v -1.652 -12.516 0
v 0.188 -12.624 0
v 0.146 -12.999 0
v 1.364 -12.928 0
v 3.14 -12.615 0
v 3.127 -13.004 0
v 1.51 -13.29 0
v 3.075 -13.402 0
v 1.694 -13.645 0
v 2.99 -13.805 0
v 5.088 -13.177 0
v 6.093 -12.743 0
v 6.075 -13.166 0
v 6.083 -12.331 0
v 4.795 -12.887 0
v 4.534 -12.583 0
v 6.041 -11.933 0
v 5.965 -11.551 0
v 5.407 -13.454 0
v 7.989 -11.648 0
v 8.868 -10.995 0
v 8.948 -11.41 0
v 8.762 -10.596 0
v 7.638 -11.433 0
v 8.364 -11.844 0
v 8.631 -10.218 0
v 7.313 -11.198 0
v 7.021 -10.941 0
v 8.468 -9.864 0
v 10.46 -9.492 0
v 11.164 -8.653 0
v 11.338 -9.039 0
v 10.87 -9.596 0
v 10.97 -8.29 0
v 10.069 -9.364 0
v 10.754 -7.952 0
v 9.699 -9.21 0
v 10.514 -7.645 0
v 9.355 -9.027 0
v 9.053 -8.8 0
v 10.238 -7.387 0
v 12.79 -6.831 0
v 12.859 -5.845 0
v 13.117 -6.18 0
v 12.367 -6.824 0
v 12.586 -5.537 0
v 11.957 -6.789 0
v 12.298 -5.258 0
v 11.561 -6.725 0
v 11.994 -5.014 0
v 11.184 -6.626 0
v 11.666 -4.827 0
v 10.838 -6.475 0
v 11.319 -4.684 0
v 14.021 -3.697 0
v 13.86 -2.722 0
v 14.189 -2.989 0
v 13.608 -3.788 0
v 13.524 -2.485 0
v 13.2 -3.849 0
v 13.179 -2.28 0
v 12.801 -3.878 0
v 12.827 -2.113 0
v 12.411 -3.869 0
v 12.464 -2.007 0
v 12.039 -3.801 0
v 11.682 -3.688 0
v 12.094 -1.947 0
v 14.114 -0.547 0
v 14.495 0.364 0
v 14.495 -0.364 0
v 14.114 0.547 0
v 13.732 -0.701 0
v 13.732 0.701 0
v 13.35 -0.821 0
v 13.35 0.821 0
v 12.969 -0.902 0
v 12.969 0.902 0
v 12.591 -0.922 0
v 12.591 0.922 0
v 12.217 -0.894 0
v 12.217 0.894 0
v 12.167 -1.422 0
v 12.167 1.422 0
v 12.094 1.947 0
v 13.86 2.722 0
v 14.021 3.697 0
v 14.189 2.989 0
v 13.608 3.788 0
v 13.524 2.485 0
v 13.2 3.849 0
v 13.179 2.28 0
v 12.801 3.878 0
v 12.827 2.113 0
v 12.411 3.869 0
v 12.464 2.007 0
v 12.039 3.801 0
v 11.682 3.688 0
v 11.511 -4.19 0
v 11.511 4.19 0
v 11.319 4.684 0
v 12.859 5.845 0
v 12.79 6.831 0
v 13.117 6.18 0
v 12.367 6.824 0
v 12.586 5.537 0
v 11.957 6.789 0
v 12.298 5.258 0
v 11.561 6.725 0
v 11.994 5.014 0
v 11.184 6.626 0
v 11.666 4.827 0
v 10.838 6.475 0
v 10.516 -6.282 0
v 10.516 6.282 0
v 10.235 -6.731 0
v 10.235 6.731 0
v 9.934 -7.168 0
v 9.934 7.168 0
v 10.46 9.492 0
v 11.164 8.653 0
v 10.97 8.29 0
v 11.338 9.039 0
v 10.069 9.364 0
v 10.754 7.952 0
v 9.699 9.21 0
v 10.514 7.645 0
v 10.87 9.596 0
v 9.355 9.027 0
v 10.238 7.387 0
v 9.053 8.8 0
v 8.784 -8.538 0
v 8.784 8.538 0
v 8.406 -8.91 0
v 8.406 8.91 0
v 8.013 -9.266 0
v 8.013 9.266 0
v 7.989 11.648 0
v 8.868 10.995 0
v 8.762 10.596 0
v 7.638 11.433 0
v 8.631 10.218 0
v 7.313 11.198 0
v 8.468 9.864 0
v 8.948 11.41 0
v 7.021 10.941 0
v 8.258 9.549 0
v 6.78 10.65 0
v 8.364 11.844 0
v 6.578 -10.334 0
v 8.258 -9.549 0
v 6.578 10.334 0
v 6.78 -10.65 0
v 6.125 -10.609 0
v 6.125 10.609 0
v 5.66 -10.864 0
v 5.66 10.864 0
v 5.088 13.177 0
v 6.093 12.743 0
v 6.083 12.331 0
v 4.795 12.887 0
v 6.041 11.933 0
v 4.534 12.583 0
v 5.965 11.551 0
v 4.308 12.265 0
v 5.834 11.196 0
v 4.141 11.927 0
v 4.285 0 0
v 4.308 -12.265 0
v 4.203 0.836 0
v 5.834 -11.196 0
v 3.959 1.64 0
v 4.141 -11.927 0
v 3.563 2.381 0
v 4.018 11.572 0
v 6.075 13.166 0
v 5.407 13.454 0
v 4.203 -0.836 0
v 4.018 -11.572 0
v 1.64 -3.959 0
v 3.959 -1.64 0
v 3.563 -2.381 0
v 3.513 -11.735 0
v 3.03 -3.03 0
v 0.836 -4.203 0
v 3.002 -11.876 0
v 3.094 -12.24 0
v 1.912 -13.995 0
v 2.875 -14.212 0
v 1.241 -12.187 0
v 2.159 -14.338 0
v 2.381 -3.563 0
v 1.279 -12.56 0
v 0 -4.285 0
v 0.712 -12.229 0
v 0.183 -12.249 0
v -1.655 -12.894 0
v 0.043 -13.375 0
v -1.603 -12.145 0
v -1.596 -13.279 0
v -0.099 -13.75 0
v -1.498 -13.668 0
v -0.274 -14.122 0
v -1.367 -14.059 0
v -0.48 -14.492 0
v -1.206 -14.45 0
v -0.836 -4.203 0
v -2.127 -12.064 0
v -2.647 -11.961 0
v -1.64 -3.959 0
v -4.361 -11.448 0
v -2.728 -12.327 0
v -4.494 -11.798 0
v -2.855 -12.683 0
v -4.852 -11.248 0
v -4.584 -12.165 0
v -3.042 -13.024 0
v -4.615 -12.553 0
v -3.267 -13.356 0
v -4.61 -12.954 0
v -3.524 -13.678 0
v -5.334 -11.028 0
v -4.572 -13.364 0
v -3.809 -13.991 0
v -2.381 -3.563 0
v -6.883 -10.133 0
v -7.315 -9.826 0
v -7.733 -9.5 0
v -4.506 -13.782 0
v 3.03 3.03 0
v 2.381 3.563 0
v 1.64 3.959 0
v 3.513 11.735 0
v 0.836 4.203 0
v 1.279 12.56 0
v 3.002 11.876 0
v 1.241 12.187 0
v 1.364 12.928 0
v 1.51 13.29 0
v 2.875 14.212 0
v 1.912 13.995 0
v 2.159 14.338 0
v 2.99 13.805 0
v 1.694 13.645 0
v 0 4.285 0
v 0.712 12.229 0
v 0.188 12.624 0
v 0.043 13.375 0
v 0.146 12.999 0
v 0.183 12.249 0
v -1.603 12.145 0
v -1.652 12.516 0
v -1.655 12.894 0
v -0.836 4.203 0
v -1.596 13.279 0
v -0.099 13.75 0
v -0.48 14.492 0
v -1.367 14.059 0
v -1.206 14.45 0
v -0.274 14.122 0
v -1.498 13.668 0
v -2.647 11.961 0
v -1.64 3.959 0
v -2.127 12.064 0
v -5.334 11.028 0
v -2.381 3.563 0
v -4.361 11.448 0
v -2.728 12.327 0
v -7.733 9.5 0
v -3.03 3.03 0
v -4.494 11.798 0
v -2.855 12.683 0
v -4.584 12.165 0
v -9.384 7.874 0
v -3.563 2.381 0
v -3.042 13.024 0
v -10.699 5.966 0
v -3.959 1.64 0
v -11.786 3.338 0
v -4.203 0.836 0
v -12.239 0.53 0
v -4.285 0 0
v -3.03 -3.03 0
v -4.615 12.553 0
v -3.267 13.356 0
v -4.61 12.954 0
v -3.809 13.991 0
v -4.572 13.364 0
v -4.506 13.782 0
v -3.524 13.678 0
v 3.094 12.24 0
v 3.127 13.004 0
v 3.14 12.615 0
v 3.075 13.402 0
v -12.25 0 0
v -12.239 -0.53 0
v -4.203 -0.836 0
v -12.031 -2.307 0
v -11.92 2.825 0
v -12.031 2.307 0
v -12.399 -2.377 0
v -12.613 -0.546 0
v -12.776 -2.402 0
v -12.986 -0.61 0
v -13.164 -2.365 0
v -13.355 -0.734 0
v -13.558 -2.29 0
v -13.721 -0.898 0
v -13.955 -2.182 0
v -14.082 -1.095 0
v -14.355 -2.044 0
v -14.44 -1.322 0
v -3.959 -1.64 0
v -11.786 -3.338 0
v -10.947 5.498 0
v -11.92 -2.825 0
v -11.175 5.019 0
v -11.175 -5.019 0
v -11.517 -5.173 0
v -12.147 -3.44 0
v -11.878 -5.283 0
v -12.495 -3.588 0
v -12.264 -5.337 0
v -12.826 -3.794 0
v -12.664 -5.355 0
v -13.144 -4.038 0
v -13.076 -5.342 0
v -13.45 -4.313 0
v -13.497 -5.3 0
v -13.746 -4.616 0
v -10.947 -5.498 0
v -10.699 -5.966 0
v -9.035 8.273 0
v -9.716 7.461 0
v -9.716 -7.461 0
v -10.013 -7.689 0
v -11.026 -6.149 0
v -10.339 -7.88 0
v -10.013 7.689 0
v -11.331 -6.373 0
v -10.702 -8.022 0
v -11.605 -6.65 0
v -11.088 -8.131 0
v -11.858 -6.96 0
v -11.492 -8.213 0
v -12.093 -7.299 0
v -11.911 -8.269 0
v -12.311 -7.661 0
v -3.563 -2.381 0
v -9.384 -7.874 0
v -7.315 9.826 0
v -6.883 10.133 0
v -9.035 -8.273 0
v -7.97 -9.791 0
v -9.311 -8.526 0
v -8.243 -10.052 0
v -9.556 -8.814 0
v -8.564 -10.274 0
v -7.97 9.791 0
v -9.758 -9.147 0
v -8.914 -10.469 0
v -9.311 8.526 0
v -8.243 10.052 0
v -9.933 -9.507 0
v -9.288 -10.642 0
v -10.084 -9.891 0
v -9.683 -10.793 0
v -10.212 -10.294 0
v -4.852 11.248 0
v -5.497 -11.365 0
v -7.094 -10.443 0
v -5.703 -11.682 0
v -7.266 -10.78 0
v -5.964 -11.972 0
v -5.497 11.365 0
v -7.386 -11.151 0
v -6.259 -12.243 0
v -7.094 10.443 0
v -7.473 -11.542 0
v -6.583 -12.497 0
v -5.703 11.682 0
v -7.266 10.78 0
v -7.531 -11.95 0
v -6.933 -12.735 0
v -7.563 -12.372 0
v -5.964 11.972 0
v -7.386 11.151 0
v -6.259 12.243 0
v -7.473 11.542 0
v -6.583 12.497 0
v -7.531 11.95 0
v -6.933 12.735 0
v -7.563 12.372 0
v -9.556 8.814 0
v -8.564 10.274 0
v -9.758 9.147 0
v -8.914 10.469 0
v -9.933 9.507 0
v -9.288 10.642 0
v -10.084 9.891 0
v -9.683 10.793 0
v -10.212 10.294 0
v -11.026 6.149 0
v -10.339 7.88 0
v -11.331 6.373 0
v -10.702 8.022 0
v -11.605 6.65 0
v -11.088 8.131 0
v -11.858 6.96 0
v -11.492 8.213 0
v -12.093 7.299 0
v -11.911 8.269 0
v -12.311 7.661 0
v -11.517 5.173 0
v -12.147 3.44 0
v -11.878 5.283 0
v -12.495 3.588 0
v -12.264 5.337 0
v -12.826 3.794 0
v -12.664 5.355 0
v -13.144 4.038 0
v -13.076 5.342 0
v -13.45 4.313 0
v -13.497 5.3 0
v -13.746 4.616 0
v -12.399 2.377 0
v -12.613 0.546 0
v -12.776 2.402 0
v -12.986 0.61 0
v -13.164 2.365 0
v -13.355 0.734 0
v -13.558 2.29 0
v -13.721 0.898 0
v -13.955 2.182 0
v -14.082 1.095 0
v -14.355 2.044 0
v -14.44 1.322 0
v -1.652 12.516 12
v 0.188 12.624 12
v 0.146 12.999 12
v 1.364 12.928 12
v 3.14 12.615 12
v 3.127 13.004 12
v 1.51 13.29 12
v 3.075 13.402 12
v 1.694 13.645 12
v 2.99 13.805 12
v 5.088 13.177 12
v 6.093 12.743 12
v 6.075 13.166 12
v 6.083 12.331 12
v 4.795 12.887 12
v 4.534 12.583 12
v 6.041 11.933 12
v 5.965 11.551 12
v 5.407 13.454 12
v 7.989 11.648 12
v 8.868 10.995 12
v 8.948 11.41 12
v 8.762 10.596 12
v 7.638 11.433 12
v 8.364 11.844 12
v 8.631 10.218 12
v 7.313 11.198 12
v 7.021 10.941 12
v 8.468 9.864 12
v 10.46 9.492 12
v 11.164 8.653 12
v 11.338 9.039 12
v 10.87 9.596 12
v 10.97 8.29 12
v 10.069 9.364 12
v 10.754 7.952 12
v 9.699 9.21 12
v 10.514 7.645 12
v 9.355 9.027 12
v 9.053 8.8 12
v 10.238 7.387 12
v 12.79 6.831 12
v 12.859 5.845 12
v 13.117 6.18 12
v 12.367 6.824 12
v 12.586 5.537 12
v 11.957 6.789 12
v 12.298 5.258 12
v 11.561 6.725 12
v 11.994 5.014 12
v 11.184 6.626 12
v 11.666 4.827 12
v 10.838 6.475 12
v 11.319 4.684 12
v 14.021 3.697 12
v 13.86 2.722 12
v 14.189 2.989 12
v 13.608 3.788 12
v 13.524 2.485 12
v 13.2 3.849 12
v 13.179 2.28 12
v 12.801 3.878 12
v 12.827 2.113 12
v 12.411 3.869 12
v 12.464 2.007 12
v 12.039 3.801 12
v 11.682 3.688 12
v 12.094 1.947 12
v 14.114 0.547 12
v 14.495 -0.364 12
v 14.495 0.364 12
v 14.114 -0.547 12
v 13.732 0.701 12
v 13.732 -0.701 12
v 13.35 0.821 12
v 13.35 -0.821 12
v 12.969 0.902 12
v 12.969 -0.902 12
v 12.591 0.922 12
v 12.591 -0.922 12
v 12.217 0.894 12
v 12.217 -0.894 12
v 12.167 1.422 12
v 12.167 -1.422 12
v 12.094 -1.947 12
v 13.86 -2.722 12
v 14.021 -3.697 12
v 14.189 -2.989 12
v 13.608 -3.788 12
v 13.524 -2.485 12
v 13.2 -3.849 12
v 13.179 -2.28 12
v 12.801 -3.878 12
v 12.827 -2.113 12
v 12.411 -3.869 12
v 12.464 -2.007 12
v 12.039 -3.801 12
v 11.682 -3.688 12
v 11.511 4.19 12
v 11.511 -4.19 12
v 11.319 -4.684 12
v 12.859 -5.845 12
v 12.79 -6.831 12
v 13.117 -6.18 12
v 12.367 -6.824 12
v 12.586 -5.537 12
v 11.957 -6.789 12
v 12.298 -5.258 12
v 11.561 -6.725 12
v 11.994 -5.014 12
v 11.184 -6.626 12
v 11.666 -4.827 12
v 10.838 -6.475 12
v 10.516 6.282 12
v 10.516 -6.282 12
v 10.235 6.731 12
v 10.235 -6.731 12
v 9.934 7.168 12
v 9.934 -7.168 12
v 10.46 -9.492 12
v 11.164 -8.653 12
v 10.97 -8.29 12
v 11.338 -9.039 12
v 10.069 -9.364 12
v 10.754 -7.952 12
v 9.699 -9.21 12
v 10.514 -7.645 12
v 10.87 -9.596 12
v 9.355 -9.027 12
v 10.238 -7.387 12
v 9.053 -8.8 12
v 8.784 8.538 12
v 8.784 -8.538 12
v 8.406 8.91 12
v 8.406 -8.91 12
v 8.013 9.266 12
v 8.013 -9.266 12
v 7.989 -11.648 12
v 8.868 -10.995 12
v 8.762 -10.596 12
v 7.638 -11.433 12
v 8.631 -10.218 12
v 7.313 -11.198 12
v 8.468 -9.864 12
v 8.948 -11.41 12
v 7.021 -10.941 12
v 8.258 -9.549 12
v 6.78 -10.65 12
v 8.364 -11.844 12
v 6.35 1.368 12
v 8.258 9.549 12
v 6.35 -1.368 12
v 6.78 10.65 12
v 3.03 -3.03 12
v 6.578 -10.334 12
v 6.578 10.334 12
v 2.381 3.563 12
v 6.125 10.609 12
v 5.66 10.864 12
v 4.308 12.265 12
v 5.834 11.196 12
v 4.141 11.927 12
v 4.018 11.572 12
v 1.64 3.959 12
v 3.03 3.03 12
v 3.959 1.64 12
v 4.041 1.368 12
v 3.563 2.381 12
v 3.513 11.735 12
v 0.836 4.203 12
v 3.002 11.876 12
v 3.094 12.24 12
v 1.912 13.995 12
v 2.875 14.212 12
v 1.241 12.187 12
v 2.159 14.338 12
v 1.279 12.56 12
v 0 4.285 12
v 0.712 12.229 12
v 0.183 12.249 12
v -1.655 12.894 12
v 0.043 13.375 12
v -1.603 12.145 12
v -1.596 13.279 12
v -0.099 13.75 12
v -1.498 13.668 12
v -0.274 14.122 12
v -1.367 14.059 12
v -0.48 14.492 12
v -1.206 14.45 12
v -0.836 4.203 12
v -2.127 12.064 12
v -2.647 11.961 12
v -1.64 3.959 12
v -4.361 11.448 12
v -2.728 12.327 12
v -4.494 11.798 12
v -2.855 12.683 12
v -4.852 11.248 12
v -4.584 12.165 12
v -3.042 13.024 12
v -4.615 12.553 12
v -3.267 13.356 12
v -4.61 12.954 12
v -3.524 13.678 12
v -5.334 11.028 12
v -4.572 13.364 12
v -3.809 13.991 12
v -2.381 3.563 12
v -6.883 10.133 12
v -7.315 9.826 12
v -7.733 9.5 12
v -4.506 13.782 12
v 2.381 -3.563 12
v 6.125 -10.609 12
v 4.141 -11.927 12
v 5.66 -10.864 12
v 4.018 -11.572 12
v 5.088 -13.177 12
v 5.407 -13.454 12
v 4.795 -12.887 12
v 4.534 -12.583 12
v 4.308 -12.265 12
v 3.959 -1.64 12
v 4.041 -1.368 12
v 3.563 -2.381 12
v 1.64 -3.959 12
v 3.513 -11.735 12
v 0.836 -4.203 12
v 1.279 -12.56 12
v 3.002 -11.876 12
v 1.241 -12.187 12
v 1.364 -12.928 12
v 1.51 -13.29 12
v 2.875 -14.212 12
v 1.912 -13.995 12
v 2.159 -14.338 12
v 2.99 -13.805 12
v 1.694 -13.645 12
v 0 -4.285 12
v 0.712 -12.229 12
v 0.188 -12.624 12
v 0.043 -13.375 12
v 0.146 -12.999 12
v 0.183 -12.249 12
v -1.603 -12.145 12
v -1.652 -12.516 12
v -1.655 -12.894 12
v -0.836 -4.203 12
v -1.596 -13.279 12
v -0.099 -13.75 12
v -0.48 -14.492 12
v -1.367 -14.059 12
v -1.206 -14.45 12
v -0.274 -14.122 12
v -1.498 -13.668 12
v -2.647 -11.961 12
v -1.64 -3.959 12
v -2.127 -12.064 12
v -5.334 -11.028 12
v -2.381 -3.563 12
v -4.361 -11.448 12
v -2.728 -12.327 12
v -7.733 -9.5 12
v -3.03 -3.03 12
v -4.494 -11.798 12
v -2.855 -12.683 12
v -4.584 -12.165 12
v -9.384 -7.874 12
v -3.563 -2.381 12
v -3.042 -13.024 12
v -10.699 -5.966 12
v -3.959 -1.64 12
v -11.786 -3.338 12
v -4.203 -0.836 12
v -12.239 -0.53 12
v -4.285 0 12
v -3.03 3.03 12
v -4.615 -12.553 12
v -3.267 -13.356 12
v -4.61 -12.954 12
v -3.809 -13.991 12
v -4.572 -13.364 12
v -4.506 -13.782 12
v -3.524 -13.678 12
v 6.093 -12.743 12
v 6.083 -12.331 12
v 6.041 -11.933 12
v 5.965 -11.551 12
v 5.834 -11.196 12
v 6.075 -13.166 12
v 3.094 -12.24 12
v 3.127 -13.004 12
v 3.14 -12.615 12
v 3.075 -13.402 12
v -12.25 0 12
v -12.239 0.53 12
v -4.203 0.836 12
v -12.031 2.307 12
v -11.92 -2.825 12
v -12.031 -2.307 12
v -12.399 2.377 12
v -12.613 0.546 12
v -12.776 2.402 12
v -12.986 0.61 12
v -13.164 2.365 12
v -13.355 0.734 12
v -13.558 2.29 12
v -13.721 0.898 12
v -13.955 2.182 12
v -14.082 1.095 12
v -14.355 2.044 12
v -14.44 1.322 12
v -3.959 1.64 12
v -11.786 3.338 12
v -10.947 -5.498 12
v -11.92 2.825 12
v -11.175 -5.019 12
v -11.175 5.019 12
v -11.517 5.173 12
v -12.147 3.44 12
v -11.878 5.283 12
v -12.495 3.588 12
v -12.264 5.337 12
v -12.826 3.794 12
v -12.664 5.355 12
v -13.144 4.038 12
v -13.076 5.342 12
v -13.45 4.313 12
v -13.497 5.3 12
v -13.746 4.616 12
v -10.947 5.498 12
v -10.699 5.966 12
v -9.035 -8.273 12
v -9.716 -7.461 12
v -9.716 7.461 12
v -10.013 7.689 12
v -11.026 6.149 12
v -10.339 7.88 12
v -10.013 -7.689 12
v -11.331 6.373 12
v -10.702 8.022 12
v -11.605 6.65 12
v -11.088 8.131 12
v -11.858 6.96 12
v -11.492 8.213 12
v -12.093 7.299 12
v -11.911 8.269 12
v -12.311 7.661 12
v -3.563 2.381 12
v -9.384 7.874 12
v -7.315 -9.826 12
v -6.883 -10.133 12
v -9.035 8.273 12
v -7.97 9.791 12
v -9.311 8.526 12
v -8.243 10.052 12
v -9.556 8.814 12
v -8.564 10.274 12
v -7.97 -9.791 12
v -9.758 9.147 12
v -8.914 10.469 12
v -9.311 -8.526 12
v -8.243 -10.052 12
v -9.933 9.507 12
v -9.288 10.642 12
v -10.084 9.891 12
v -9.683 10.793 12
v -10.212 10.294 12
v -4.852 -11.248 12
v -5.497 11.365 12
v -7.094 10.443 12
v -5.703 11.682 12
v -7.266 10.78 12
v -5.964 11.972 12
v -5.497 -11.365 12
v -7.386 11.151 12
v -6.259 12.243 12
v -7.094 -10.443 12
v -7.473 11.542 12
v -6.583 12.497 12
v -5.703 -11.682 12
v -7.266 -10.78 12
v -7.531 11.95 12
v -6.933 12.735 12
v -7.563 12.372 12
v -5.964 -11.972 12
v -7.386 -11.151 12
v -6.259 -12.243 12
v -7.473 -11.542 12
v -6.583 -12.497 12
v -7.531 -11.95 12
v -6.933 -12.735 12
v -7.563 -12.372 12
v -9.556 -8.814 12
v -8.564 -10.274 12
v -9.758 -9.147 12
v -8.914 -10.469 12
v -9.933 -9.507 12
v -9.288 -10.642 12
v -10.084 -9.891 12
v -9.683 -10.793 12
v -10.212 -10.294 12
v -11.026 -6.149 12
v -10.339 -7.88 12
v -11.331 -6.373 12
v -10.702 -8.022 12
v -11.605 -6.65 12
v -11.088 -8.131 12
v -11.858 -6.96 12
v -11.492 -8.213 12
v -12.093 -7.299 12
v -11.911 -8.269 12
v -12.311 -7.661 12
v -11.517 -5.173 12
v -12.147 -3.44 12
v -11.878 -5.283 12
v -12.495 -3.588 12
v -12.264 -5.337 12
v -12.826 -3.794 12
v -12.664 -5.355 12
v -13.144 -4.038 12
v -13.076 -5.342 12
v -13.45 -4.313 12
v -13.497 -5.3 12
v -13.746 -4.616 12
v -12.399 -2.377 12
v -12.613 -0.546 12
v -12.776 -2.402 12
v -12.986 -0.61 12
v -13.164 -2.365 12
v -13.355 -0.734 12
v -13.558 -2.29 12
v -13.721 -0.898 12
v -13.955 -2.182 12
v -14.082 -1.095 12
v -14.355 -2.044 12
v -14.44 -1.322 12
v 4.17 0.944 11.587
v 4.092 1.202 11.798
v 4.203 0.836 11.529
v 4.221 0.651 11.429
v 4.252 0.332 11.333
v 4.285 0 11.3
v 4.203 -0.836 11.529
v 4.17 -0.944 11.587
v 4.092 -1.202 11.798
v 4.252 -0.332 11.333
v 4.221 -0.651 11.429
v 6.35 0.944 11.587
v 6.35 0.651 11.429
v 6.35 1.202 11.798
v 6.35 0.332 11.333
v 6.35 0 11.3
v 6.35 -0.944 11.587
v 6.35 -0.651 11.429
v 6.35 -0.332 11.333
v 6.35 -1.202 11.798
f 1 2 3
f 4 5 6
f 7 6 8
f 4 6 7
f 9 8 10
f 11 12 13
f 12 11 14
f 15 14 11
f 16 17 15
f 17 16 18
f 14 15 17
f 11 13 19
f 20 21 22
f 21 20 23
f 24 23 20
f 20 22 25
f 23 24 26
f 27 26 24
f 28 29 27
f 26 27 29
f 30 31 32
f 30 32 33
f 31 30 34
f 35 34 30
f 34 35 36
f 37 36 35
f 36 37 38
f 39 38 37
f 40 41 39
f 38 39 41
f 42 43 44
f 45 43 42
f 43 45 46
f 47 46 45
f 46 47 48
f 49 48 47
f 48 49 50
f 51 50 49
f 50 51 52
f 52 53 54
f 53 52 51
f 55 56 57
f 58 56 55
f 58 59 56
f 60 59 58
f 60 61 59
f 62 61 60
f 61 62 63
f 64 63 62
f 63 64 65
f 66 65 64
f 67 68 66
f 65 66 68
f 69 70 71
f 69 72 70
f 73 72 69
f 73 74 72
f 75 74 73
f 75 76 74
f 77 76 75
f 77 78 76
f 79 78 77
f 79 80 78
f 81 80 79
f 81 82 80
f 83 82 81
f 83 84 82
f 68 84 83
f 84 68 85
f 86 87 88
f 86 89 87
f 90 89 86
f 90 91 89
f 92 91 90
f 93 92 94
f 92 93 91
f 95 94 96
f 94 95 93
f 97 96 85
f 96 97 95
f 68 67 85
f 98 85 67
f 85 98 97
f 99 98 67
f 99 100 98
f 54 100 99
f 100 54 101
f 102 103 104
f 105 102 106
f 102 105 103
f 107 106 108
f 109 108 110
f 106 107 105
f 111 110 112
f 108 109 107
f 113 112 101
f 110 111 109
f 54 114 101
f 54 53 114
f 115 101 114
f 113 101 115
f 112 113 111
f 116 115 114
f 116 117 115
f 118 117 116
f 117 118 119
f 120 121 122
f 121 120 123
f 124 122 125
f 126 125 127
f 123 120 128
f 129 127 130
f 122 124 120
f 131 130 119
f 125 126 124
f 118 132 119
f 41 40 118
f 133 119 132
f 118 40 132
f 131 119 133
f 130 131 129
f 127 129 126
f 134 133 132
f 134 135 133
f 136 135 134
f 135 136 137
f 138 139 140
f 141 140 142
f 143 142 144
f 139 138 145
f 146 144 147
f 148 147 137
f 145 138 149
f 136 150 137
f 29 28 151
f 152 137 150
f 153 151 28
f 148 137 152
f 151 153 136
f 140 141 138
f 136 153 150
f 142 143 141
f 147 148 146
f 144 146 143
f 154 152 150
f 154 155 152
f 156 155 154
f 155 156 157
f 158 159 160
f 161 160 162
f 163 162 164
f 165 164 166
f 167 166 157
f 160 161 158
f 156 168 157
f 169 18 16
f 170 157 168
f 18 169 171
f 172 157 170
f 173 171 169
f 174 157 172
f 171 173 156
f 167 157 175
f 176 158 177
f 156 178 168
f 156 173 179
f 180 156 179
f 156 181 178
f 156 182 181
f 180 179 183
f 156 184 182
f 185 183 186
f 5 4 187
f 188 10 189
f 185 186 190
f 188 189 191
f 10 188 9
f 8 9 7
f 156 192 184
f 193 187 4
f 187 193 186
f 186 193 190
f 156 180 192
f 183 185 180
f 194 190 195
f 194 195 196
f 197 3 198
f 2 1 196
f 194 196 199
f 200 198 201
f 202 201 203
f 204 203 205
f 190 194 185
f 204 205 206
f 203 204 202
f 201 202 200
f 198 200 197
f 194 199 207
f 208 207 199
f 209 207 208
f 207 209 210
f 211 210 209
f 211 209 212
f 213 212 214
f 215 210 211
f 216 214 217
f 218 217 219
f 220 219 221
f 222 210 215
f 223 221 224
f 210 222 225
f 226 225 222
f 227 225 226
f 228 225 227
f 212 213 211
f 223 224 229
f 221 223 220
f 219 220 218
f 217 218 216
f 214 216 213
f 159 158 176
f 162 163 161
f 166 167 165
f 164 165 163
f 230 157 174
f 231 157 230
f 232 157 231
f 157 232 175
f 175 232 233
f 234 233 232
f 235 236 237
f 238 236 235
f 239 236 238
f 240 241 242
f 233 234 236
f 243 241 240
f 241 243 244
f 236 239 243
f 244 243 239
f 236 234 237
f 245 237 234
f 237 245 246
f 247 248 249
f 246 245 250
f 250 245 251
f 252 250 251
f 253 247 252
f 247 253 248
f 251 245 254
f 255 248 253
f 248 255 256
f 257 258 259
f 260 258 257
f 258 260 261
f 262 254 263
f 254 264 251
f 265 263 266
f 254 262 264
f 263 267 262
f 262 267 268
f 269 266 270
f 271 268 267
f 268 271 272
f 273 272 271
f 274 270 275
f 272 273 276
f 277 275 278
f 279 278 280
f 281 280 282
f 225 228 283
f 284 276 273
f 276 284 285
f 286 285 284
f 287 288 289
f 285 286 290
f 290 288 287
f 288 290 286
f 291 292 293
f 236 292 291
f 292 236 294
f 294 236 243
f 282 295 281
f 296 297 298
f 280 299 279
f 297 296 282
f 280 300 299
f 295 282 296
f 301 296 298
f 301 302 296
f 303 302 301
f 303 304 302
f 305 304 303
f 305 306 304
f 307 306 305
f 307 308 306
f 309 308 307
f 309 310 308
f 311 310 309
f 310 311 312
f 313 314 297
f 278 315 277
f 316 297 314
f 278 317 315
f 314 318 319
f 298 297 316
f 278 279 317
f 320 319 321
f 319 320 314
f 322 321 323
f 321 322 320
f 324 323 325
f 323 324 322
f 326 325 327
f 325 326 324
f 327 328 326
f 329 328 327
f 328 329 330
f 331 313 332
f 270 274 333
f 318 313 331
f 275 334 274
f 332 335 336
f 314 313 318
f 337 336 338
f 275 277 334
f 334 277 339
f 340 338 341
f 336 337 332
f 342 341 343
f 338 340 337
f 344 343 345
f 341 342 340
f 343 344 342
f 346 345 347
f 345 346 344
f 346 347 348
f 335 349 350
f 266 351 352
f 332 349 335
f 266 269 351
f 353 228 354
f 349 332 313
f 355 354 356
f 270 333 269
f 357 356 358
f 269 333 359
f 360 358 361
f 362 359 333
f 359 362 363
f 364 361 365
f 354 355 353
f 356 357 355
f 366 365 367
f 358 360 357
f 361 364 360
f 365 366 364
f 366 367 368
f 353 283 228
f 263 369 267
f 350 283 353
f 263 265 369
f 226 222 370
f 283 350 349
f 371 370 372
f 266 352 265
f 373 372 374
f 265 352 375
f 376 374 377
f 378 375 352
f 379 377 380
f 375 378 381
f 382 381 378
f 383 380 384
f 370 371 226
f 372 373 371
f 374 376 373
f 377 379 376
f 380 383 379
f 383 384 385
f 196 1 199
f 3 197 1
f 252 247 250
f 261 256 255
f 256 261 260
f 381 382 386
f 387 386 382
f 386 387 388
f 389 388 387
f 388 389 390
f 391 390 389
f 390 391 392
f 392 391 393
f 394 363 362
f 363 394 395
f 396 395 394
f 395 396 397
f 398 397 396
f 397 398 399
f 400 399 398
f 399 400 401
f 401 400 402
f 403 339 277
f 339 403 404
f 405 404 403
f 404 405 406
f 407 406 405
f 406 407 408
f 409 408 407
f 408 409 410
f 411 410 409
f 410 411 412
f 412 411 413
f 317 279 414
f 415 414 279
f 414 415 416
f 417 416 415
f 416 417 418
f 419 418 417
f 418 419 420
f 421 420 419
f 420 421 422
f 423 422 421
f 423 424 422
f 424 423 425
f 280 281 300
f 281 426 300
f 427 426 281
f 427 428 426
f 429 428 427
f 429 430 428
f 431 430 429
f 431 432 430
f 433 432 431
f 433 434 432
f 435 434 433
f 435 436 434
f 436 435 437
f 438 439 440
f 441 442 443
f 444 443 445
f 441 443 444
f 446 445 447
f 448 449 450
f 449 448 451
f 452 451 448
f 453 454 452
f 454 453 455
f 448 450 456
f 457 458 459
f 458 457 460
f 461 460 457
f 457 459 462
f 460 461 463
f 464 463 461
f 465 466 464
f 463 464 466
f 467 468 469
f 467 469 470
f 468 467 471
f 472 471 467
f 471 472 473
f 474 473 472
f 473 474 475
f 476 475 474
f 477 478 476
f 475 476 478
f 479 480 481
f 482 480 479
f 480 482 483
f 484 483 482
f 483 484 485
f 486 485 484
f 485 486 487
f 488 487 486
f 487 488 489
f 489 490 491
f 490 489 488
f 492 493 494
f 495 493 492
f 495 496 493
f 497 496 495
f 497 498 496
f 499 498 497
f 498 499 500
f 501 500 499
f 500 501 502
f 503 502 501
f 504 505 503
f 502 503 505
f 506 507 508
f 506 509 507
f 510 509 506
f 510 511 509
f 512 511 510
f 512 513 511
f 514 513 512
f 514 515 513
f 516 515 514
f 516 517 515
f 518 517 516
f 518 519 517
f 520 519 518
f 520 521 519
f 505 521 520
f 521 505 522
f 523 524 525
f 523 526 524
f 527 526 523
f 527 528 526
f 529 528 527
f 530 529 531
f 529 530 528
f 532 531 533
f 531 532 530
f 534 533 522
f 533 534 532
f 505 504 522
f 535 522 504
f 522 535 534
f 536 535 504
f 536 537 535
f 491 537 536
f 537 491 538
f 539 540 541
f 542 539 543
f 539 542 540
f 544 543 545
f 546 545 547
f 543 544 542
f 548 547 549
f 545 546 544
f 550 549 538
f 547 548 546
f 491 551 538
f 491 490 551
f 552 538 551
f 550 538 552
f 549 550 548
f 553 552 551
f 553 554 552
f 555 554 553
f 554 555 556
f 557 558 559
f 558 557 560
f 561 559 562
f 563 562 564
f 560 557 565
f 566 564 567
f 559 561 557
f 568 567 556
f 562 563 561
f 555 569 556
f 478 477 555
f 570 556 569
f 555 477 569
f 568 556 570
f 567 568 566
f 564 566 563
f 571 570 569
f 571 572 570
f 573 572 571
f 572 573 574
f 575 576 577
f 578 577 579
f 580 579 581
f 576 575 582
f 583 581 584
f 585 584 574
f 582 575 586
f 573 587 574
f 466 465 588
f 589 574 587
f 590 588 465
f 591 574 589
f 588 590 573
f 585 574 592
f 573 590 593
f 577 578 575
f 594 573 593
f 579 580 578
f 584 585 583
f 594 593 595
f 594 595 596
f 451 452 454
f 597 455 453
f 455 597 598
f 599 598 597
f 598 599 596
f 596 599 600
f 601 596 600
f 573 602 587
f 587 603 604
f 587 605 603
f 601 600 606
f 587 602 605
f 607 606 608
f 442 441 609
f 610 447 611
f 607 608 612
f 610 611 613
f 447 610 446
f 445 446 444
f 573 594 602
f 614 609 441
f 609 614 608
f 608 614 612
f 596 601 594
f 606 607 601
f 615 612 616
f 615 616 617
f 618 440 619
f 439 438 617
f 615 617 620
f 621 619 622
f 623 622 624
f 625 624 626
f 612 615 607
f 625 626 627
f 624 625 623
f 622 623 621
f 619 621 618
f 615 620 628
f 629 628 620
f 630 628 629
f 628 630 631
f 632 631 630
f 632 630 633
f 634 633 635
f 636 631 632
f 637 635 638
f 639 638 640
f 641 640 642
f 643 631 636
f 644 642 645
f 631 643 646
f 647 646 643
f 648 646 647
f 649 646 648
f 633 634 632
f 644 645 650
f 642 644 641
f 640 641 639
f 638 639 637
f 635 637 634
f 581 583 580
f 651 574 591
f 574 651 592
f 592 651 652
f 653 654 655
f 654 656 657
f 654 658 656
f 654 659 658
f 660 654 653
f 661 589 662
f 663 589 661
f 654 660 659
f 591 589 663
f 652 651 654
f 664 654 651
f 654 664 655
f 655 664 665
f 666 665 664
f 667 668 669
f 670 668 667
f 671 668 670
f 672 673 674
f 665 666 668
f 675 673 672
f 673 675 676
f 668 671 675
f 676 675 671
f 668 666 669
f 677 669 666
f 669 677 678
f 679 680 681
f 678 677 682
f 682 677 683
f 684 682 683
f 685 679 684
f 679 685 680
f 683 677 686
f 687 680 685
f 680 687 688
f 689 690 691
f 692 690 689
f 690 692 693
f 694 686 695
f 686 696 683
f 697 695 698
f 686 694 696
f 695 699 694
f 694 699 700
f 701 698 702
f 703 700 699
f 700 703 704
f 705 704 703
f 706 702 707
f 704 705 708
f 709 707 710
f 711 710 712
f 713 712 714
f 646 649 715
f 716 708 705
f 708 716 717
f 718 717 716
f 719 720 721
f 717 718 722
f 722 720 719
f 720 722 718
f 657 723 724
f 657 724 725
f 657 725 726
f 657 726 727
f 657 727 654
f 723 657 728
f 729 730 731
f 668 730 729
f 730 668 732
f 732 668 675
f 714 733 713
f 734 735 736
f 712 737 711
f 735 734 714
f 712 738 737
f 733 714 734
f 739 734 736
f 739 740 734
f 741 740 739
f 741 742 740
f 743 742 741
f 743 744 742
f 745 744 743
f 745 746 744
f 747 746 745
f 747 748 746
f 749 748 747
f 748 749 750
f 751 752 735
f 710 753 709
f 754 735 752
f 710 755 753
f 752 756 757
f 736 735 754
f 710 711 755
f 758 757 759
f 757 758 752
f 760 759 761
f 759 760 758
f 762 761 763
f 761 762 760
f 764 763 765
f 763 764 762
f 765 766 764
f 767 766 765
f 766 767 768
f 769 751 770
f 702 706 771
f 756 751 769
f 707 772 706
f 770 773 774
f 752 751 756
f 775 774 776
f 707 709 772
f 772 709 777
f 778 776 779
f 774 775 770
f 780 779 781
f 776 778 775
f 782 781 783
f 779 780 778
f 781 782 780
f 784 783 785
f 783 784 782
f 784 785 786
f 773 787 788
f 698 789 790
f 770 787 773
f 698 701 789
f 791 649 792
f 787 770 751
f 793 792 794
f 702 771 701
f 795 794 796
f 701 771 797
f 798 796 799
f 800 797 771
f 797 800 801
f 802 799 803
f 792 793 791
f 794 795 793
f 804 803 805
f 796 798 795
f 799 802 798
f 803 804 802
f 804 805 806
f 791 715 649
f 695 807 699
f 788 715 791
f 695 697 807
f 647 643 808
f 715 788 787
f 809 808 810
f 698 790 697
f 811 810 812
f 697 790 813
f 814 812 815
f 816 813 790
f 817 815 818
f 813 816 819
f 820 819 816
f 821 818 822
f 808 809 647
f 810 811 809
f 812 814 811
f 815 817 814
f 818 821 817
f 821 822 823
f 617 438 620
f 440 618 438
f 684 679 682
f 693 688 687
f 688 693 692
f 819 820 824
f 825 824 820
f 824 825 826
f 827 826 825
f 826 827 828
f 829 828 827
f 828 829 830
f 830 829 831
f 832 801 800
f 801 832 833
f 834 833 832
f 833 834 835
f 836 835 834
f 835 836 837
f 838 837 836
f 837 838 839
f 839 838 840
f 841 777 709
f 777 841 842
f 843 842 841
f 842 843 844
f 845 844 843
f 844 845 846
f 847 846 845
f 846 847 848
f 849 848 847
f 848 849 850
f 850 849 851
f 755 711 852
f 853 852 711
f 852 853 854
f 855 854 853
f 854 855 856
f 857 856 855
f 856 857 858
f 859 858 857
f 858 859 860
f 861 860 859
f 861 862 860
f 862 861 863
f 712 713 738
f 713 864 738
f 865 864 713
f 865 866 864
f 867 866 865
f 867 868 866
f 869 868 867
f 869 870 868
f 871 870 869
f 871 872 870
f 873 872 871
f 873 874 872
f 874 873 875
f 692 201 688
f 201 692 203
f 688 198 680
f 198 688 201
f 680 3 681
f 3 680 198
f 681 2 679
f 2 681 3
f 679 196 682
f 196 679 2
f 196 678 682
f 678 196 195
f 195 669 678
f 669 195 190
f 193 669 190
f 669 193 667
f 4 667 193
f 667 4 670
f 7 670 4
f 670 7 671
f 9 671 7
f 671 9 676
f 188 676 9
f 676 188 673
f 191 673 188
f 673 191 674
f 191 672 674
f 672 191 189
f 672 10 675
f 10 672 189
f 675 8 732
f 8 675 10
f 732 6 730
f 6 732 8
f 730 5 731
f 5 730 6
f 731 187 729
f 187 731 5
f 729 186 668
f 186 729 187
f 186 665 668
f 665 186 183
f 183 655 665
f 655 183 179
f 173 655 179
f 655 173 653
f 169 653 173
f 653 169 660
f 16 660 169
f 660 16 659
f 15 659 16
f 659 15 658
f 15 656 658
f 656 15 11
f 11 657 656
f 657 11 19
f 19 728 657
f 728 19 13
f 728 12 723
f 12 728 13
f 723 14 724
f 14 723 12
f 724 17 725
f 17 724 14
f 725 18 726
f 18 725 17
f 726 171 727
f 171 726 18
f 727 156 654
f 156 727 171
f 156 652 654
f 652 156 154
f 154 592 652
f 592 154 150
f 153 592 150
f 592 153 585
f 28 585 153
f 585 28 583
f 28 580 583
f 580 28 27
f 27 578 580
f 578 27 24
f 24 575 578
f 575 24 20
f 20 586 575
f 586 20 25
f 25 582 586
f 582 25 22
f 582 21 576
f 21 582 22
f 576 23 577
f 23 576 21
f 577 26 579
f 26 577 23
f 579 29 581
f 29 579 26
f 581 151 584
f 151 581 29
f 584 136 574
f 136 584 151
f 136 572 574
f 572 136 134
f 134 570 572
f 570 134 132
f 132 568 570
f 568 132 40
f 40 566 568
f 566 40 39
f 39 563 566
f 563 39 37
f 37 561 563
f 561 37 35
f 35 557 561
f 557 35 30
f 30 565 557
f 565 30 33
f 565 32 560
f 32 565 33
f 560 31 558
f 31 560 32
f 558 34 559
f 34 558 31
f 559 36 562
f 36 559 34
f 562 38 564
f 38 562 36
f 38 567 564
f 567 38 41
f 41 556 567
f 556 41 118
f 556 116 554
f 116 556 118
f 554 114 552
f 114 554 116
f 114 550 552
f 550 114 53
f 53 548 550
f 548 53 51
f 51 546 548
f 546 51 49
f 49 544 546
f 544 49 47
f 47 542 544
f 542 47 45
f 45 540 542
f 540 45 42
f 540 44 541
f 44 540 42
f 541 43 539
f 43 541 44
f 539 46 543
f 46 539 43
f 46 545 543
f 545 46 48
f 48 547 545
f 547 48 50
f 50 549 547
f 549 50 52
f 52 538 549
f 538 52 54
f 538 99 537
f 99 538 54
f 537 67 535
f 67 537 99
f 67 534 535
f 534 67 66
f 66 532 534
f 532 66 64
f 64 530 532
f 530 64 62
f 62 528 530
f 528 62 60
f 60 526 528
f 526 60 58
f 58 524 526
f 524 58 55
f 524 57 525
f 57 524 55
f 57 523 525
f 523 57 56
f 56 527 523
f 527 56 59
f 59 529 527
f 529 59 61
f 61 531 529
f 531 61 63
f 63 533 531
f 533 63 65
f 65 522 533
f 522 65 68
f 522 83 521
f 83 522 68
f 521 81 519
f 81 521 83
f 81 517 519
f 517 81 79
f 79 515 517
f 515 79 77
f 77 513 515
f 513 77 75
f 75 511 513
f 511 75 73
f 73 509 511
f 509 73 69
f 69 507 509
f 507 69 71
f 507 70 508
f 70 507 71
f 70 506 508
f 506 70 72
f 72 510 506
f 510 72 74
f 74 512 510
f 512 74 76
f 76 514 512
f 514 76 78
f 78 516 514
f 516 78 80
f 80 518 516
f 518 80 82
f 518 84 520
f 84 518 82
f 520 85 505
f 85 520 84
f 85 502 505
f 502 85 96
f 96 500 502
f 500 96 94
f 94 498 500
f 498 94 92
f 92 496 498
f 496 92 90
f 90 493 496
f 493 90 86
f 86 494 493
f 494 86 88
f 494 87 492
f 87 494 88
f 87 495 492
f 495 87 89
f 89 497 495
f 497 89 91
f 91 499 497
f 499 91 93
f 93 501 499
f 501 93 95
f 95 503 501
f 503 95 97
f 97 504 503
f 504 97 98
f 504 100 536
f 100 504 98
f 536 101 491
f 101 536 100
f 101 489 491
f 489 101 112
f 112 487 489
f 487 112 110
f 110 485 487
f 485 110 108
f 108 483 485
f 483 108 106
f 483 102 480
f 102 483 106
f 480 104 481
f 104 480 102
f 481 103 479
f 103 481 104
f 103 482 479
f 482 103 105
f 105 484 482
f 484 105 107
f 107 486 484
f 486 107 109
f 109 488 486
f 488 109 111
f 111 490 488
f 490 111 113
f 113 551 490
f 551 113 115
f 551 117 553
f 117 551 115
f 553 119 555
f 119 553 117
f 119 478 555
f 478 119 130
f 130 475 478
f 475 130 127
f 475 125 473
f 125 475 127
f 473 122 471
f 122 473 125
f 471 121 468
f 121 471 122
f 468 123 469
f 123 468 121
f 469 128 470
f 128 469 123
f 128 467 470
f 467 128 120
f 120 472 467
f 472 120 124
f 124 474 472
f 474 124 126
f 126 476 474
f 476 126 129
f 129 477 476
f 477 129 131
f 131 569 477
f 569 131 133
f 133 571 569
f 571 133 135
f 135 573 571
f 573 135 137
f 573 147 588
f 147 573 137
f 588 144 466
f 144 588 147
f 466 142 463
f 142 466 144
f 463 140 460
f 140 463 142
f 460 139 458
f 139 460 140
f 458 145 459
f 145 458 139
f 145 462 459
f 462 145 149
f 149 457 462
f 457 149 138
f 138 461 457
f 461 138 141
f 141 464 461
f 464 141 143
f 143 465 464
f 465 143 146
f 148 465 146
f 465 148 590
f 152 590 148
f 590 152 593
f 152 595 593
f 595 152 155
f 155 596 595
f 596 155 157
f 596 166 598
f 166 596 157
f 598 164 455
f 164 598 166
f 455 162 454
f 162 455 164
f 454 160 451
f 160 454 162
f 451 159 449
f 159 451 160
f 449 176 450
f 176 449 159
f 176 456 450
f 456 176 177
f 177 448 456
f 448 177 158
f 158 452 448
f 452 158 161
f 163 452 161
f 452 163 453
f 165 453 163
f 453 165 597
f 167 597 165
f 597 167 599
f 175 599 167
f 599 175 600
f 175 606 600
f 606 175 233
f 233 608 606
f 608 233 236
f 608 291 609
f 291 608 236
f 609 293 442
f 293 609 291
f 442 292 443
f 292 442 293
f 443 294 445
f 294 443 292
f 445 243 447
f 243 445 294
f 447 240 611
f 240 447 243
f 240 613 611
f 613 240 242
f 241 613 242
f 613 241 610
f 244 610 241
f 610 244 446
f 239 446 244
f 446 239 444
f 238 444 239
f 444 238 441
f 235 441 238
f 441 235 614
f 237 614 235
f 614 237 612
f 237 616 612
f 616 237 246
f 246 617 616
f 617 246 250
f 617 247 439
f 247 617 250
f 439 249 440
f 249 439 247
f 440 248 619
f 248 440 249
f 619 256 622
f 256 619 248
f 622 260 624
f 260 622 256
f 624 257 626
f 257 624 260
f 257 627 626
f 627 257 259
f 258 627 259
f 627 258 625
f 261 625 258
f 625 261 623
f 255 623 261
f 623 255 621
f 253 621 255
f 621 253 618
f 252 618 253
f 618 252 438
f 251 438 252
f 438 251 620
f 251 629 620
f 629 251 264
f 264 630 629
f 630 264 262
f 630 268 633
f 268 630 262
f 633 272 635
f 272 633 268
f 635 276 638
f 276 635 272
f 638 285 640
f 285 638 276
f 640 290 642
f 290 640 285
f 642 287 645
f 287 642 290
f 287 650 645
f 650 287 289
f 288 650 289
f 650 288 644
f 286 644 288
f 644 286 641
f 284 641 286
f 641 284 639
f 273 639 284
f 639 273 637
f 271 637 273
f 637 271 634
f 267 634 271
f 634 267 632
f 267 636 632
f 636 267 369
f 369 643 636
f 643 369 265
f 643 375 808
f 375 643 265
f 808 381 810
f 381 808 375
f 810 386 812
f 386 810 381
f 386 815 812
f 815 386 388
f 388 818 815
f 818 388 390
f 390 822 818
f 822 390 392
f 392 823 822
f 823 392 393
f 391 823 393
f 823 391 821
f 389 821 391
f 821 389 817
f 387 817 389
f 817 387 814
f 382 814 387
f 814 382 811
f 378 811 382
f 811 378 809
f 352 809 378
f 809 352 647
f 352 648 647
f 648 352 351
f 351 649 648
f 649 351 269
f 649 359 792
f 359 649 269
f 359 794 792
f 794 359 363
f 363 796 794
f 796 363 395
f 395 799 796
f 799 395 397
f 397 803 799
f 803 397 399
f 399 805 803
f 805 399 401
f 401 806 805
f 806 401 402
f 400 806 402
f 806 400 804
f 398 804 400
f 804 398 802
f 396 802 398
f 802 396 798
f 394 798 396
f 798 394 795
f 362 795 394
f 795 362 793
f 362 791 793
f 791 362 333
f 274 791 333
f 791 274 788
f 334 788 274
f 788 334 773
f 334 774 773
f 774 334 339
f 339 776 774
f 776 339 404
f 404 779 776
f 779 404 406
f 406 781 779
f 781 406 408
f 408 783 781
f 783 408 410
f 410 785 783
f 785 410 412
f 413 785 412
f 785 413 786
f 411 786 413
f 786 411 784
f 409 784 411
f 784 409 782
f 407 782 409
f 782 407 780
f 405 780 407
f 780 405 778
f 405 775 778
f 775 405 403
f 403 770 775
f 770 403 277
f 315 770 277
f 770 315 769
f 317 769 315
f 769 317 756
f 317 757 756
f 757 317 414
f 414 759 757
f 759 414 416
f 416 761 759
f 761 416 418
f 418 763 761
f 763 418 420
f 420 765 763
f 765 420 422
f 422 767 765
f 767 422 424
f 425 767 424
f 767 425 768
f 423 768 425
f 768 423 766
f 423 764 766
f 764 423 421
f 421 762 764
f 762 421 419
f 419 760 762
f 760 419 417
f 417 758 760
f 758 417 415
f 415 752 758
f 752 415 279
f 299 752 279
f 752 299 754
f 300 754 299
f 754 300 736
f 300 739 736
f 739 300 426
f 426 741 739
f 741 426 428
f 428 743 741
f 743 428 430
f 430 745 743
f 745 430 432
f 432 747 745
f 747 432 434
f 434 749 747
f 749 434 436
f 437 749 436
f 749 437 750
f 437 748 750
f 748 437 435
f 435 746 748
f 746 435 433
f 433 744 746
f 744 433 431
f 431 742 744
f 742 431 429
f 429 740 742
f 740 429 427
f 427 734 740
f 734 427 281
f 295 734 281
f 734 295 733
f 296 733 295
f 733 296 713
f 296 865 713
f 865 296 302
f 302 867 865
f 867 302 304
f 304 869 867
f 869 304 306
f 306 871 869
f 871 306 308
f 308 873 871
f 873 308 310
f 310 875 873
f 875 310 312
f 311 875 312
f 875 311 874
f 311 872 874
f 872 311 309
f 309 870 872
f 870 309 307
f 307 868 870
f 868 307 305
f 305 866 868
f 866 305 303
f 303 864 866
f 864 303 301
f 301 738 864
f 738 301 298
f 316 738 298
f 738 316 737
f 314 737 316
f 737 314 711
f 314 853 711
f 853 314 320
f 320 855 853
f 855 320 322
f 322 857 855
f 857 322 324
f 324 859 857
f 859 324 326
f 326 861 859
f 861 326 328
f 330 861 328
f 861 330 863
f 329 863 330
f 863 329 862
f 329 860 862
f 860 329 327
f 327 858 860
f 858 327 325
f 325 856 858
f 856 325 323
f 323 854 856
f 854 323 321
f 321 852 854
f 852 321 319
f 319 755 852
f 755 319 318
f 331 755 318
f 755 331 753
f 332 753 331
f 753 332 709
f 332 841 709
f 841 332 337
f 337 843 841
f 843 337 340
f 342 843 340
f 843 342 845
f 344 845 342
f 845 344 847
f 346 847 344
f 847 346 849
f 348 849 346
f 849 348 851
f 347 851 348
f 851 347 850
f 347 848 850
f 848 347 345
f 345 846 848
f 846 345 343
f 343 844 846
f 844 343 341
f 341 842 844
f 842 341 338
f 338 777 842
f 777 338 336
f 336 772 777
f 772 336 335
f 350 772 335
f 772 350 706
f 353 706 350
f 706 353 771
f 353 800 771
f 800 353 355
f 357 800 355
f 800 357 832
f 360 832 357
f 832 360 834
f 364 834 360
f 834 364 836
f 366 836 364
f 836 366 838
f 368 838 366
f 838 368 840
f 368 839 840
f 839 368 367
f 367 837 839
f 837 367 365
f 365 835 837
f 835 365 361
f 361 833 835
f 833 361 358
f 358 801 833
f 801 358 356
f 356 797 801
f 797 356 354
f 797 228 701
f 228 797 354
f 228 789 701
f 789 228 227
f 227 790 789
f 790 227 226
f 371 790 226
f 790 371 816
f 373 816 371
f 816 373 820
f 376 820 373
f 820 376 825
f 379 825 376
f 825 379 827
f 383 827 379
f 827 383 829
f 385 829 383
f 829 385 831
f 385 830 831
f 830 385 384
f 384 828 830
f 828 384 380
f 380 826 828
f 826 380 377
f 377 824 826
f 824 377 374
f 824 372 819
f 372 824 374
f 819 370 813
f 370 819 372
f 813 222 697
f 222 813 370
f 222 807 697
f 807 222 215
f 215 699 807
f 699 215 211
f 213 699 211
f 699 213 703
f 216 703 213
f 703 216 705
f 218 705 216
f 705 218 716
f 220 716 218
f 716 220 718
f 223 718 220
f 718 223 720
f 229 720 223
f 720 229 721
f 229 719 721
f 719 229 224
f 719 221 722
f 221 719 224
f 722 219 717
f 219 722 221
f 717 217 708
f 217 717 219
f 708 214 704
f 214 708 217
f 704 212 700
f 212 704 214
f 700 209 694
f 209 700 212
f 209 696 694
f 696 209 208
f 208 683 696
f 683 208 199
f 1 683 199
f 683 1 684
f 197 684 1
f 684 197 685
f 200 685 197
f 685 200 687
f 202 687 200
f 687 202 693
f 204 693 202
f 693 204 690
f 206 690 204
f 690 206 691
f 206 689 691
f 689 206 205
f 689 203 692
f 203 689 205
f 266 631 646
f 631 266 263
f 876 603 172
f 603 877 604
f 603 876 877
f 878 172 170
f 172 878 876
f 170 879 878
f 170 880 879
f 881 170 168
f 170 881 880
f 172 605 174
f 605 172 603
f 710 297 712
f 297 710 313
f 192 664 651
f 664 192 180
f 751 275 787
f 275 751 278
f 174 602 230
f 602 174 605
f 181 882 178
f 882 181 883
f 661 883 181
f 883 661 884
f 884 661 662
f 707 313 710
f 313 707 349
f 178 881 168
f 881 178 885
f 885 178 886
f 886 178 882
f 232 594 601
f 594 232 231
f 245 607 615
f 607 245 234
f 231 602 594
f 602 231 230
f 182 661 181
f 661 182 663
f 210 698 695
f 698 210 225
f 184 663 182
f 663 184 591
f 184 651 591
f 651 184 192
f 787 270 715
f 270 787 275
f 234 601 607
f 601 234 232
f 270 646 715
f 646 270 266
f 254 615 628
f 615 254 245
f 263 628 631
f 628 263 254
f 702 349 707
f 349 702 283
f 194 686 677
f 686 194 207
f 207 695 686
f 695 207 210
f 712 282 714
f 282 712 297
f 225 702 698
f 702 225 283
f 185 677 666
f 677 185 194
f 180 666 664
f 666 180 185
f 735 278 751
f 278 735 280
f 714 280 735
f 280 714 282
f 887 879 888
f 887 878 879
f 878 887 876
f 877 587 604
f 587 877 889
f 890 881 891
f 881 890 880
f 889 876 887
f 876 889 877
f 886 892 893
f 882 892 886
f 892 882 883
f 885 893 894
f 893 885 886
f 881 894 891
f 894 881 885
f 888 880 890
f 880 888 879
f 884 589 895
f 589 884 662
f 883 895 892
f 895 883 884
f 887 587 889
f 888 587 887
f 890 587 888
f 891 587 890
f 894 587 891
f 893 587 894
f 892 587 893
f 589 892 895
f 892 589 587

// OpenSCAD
$fn = 32;

// ----------------------------------------------------------------------
// Spur gear: m=1 z=27, 29 mm tip diameter x 12 mm
// ----------------------------------------------------------------------

// --- parameters (mm) ---
gear_module = 1;          // module
tooth_count = 27;         // number of teeth
gear_w = 12;              // face width
pa = 20;                  // pressure angle, deg
bore = 8.57;              // shaft bore
set_d = 3.4;              // set screw tap hole
set_z = 13;               // set screw height

/* --- involute profile --- */
pitch_r = gear_module * tooth_count / 2;
base_r = pitch_r * cos(pa);
tip_r = pitch_r + gear_module;
root_r = pitch_r - 1.25 * gear_module;
flank_steps = 6;

function inv_deg(a) = (tan(a) - a * PI / 180) * 180 / PI;
function flank_r(i) = root_r + (tip_r - root_r) * i / flank_steps;
function half_angle(r) = 90 / tooth_count + inv_deg(pa) - inv_deg(acos(min(1, base_r / r)));
function tooth_pt(k, i, side) =
    let (r = flank_r(i), a = k * 360 / tooth_count + side * half_angle(r))
    [r * cos(a), r * sin(a)];

module tooth_profile() {
  polygon(points = [
    for (k = [0 : tooth_count - 1])
      each [
        for (i = [0 : flank_steps]) tooth_pt(k, i, -1),
        for (i = [flank_steps : -1 : 0]) tooth_pt(k, i, 1),
        let (ta = (k + 0.5) * 360 / tooth_count)
          [root_r * cos(ta), root_r * sin(ta)]
      ]
  ]);
}

module gear_disc() {
  linear_extrude(height = gear_w) tooth_profile();
}

difference() {
  gear_disc();
  translate([0, 0, -1]) cylinder(h = gear_w + 3, d = bore);
  /* set screw, drilled radially */
  translate([-1, 0, set_z]) rotate([0, 90, 0]) cylinder(h = (root_r * 0.6), d = set_d);
}
